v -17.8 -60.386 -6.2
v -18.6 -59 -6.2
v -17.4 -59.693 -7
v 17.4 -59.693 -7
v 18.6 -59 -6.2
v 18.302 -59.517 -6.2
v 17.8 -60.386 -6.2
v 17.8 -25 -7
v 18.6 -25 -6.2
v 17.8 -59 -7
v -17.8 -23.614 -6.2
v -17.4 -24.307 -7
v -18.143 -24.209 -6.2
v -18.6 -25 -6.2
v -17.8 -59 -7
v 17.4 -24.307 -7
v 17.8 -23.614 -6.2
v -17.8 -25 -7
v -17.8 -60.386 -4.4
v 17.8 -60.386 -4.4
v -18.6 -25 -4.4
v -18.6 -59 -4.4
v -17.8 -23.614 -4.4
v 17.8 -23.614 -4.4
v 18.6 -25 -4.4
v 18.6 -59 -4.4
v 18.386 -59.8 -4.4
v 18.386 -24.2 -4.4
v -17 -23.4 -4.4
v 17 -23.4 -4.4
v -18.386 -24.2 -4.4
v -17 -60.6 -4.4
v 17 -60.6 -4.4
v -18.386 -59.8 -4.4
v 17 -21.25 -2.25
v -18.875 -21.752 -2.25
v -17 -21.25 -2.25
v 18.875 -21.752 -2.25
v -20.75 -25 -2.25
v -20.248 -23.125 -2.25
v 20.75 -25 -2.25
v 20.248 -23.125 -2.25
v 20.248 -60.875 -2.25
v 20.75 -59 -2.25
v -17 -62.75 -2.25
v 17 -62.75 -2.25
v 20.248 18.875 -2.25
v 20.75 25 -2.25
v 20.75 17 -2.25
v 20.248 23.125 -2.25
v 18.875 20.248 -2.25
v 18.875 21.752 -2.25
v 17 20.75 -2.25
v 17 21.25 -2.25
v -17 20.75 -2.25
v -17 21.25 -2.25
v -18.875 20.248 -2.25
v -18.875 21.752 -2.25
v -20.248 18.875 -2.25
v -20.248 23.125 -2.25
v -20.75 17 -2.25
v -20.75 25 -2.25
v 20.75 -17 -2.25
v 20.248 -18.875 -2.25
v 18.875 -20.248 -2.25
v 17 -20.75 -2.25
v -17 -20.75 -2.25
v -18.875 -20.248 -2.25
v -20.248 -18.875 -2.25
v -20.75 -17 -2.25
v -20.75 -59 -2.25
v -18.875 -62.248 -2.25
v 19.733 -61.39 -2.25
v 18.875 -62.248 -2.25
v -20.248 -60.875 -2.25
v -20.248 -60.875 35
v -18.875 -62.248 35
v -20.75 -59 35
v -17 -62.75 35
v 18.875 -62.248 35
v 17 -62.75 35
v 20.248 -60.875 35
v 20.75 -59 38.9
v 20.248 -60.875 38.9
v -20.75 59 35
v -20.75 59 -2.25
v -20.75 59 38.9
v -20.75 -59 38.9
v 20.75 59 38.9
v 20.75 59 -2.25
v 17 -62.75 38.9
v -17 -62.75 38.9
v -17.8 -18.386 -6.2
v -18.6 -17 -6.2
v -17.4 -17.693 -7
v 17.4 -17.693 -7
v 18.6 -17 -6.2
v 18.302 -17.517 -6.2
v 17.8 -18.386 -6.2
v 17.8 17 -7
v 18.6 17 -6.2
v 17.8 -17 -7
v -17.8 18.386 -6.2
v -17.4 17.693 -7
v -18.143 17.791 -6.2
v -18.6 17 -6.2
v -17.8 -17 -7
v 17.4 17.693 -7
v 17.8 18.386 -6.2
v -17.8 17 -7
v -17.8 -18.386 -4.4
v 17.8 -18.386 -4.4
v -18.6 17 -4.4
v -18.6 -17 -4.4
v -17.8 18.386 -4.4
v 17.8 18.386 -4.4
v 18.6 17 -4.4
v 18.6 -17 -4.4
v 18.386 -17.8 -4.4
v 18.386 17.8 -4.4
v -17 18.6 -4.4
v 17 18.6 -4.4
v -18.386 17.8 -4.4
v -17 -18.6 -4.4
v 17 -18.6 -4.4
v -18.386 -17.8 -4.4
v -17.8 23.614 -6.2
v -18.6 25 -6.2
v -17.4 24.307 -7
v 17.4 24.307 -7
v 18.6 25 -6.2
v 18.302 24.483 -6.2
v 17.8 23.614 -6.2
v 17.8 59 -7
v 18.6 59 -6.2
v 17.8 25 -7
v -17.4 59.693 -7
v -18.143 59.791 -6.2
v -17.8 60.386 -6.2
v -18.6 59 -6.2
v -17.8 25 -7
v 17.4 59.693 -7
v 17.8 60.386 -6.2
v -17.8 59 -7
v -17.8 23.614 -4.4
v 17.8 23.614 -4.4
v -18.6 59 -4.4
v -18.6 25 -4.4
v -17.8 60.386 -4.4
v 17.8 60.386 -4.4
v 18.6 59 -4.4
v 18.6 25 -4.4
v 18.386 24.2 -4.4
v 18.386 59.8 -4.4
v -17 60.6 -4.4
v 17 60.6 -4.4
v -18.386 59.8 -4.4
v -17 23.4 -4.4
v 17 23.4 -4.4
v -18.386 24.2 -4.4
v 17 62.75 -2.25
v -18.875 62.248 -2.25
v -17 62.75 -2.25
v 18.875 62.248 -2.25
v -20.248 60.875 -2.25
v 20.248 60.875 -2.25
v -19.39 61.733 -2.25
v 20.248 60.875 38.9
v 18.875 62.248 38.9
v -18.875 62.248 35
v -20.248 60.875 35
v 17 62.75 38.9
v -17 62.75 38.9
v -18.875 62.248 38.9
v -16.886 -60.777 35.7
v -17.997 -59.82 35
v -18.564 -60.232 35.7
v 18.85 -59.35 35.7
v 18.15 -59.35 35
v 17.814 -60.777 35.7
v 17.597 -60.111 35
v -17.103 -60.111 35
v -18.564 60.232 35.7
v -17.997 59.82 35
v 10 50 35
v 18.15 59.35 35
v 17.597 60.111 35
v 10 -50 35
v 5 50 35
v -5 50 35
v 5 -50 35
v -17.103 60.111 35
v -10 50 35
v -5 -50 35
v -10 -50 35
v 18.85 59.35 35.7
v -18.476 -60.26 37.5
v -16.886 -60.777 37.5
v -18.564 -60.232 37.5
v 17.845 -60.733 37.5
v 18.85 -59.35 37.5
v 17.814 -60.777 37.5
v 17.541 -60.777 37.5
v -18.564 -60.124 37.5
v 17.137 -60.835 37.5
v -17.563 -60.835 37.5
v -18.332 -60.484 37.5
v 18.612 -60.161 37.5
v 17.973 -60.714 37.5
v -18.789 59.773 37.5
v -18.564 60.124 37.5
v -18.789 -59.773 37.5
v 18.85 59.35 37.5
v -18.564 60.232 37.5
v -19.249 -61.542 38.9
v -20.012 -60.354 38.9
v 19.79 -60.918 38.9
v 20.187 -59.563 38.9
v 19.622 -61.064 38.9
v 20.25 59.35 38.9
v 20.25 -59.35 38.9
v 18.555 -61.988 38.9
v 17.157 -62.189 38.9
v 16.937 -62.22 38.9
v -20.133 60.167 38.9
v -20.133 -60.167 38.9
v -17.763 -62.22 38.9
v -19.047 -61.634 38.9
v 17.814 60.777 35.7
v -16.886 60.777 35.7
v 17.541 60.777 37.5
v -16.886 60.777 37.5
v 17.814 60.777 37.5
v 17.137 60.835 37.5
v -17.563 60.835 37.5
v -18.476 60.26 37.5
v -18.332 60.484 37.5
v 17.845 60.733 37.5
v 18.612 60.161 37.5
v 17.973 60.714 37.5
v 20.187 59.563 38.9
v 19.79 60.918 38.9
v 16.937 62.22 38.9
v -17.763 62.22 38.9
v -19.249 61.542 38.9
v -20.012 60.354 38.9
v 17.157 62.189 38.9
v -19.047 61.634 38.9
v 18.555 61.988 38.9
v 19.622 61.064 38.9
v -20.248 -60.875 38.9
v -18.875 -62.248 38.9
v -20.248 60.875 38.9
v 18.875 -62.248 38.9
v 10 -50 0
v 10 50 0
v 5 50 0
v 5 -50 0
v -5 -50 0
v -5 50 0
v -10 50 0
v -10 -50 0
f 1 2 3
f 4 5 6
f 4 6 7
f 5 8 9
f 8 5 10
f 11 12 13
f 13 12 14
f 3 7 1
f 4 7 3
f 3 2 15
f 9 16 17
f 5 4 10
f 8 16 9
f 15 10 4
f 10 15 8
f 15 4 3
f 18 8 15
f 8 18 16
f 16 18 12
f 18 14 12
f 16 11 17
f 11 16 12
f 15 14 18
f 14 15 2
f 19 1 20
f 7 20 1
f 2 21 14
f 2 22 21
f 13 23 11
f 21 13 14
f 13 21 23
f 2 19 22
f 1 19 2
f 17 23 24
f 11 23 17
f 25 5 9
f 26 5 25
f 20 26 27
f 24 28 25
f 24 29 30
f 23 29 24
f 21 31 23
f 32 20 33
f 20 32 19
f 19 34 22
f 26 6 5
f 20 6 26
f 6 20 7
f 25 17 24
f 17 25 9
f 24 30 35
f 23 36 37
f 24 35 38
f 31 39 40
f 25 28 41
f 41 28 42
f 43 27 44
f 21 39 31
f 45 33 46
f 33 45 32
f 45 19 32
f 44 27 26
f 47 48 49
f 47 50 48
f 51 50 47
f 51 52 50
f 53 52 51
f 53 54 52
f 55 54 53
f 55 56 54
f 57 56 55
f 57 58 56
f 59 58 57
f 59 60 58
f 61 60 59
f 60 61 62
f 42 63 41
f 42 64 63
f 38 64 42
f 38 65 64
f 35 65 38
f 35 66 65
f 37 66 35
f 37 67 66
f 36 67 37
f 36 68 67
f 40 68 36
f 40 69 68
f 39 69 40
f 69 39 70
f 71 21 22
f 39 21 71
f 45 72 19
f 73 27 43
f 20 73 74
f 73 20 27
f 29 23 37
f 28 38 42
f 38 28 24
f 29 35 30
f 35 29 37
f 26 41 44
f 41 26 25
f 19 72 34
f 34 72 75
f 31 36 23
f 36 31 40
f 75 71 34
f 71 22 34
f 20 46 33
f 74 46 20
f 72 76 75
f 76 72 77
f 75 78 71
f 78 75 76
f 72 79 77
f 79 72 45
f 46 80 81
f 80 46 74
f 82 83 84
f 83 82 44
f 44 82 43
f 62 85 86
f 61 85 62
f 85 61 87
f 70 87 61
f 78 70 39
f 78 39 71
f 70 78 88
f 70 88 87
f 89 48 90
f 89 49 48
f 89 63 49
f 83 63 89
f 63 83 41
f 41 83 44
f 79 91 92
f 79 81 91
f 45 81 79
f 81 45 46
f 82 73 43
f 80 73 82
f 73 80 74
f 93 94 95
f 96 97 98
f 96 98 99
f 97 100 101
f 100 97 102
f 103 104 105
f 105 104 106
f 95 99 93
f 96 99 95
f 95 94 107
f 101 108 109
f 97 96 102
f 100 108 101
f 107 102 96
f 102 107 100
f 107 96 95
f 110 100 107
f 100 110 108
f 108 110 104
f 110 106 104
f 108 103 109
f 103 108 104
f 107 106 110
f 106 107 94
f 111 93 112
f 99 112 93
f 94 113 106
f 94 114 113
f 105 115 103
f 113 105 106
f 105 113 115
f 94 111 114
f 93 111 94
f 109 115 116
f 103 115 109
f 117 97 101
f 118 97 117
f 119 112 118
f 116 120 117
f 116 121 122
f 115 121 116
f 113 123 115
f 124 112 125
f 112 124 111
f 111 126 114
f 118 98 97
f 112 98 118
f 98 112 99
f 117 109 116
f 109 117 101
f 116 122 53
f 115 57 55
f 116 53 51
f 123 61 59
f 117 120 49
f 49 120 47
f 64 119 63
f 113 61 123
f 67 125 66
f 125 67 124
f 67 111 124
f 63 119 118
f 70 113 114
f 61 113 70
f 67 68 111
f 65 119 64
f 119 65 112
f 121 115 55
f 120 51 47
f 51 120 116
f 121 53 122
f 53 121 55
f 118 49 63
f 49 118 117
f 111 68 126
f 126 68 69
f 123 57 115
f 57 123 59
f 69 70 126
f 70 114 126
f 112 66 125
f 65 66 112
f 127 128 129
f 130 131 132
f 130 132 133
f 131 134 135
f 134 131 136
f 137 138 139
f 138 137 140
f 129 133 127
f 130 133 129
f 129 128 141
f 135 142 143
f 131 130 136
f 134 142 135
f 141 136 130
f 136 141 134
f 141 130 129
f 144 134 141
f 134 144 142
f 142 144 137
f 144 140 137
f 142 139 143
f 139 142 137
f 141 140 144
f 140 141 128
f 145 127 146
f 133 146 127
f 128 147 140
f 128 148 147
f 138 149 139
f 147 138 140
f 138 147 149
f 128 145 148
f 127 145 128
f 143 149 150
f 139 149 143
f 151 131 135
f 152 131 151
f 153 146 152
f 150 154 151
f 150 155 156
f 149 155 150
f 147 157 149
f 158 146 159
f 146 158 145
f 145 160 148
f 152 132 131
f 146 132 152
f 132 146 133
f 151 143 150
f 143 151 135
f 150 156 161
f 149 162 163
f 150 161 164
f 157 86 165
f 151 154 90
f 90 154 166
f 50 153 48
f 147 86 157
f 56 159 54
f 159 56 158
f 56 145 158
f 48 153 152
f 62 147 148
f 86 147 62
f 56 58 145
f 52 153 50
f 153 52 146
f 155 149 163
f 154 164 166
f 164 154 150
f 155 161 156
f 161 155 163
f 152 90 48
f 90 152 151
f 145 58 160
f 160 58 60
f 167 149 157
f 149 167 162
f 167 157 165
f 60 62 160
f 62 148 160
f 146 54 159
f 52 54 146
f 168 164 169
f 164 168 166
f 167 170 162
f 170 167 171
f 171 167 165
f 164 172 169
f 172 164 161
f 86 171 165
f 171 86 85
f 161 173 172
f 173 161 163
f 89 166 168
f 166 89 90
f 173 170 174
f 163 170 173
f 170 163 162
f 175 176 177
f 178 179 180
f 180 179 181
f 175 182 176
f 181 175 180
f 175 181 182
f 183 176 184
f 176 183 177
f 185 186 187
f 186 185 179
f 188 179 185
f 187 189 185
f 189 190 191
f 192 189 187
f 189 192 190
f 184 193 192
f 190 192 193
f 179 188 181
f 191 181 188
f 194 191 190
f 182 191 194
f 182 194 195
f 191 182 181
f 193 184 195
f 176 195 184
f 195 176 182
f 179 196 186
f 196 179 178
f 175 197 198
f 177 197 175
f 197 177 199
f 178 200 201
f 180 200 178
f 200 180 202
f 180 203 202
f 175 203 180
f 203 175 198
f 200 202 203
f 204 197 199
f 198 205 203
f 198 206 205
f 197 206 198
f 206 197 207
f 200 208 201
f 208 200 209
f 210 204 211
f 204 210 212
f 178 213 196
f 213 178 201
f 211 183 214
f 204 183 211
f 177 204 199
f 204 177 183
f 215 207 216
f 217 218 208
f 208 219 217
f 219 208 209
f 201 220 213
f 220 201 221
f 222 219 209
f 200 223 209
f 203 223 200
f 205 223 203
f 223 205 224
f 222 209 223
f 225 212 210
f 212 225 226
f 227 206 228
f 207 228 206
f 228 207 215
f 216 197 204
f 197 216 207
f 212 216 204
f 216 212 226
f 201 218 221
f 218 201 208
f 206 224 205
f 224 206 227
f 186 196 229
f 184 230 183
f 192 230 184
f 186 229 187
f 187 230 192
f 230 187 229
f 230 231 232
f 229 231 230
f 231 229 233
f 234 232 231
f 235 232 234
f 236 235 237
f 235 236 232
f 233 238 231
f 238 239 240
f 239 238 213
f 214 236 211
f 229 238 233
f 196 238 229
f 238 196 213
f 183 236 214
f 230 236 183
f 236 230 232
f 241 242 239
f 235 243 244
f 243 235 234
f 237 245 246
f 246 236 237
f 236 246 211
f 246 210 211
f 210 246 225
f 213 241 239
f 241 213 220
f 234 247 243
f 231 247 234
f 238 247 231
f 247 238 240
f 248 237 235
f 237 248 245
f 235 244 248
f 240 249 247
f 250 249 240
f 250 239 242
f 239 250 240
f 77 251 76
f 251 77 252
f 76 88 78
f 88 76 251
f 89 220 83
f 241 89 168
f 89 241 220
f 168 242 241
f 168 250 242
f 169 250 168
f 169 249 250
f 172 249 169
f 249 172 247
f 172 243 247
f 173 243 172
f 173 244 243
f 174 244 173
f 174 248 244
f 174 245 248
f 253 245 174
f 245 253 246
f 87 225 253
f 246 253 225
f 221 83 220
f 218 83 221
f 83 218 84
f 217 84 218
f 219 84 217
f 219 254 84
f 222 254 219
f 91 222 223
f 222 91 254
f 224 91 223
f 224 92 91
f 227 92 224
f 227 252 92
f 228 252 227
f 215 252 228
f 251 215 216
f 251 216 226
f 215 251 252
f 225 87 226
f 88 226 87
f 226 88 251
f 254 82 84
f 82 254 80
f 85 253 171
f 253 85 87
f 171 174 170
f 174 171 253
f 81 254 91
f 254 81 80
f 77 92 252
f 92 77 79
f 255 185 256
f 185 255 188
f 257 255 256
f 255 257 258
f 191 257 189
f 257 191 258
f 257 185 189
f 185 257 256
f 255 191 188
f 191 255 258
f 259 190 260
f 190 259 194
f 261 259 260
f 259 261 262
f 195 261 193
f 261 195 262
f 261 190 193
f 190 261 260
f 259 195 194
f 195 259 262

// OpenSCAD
// file: ../utils/misc.scad
module rounded_rectangle(width, height, corner_radius, center = false) {

    x_offset = center ? -width/2 : 0;
    y_offset = center ? -height/2 : 0;

    corners_points = [
            [corner_radius, corner_radius],
            [width - corner_radius, corner_radius],
            [width - corner_radius, height - corner_radius],
            [corner_radius, height - corner_radius],
        ];

    hull() {
        for (p = corners_points) {
            translate([p.x + x_offset, p.y + y_offset, -1])
                circle(corner_radius);
        }
    }
}


module circle_segment(radius, cut_off_height) {
    intersection() {
        translate([0, -cut_off_height]) {
            circle(radius);
        }
        translate([-radius, 0]) {
            square([radius * 2, cut_off_height * 2]);
        }
    }
}

module tear_drop_circle(d) {
    r = d / 2;
    angle = 30;
    offset_y = r / 2;
    offset_x = cos(angle) * r;

    triangle_points = [
            [-offset_x, r / 2],
            [offset_x, r / 2],
            [0, 3 / 2 * r]
        ];

    polygon(triangle_points);
    circle(d = d);

}
// file: ../utils/gridfinity/bin_stacking_lip.scad
include <./constants.scad>

use <../misc.scad>

height_level_1 = 0.7;
height_level_2 = 1.8;
height_level_3 = 1.9;
total_height = height_level_1 + height_level_2 + height_level_3;

cell_width = 41.5;
middle_width = cell_width - height_level_3 * 2;
bottom_width = middle_width - height_level_1 * 2;

top_radius = 7.5 / 2;
top_radius_adjusted = 7.5 / 2 - 0.35;
middle_radius_adjusted = 3.2 / 2 - 0.1;
bottom_radius = 1.6 / 2;

wall_width = 0.95;

module gf_stacking_lip(num_columns, num_rows, offset_gfus = 0) {

    total_width = cell_width * num_columns + (num_columns - 1) * GF_WIDTH_TOLERANCE;
    total_depth = cell_width * num_rows + (num_rows - 1) * GF_WIDTH_TOLERANCE;

    translate([0, 0, offset_gfus * GF_HEIGHT_1U]) {
        // main lip
        difference() {
            linear_extrude(total_height - 0.5) {
                translate([total_width / 2, total_depth / 2]) {
                    rounded_rectangle(total_width, total_depth, top_radius, center = true);
                }
            }

            _combined_cells_cut_out(num_columns, num_rows);
        }

        // bottom down-chamfer (ugly approximation of a prism-looking thing)
        chamfer_height = height_level_1 + height_level_3;
        translate([total_width / 2, total_depth / 2, -chamfer_height]) {
            difference() {
                linear_extrude(chamfer_height) {
                    rounded_rectangle(total_width, total_depth, top_radius, center = true);
                }

                x = (total_width / 2) - wall_width - chamfer_height + 0.15;
                y = (total_depth / 2) - wall_width - chamfer_height + 0.15;

                hull() {
                    for (p = [[-x, -y], [-x, y], [x, -y], [x, y]]) {
                        translate([p.x, p.y, 0]) {
                            cylinder(h = chamfer_height, r1 = top_radius_adjusted, r2 = bottom_radius);
                        }
                    }
                }
            }
        }
    }
}

module _combined_cells_cut_out(num_columns, num_rows) {
    // paint lots of ovelapping copies to create the final cut out. I couldn't use a simple hull to do it.

    points = [
        for (c = [0 : num_columns - 1]) for (r = [0 : num_rows - 1])
            [c, r]
        ];

    offset_x = -GF_WIDTH_TOLERANCE;
    offset_y = -GF_WIDTH_TOLERANCE;

    translate([offset_x, offset_y, 0]) {
        for (p = points) {
            cx = p.x * GF_WIDTH + GF_WIDTH / 2 + GF_WIDTH_TOLERANCE / 2;
            cy = p.y * GF_WIDTH + GF_WIDTH / 2 + GF_WIDTH_TOLERANCE / 2;

            translate([cx, cy]) {
                _single_cell_cut_out();
            }

            if (p.x < num_columns - 1) {
                translate([cx + cell_width / 2, cy]) {
                    _single_cell_cut_out();
                }
            }

            if (p.y < num_rows - 1) {
                translate([cx, cy + cell_width / 2]) {
                    _single_cell_cut_out();
                }
            }

            if (p.y < num_rows - 1 && p.x < num_columns - 1) {
                translate([cx + cell_width / 2, cy + cell_width / 2]) {
                    _single_cell_cut_out();
                }
            }
        }
    }
}

module _single_cell_cut_out() {
    union() {
        union() {
            // level 1
            offset_z = 0;
            t = (bottom_width / 2) - bottom_radius;
            hull() {
                for (p = [[-t, -t], [-t, t], [t, -t], [t, t]]) {
                    translate([p.x, p.y, offset_z]) {
                        cylinder(h = height_level_1, r1 = bottom_radius, r2 = middle_radius_adjusted);
                    }
                }
            }
        }

        union() {
            // level 2
            offset_z = height_level_1;
            t = (middle_width / 2) - middle_radius_adjusted;
            hull() {
                for (p = [[-t, -t], [-t, t], [t, -t], [t, t]]) {
                    translate([p.x, p.y, offset_z]) {
                        cylinder(h = height_level_2, r1 = middle_radius_adjusted, r2 = middle_radius_adjusted);
                    }
                }
            }
        }

        union() {
            // level 2
            offset_z = height_level_2 + height_level_1;
            t = (cell_width / 2) - top_radius_adjusted;
            hull() {
                for (p = [[-t, -t], [-t, t], [t, -t], [t, t]]) {
                    translate([p.x, p.y, offset_z]) {
                        cylinder(h = height_level_3, r1 = middle_radius_adjusted, r2 = top_radius_adjusted);
                    }
                }
            }
        }
    }
}
// file: ../utils/gridfinity/bin_base.scad
use <../misc.scad>
use <./functions.scad>
include <./constants.scad>


angle = 45;

height_level_1 = 0.8;
height_level_2 = 1.8;
height_level_3 = 2.15;
height_level_4 = GF_HEIGHT_1U - height_level_1 - height_level_2 - height_level_3;

inner_width = 35.6;
middle_width = inner_width + 0.8 * 2;
outer_width = middle_width + 2.15 * 2;

radius_outer = GF_BIN_CORNER_RADIUS;
radius_middle = 3.2 / 2;
radius_inner = 1.6 / 2;

module gf_combined_bin_bases(num_columns, num_rows, lowered = true) {
    points = [
        for (c = [0 : num_columns - 1]) for (r = [0 : num_rows - 1])
            [c, r]
        ];

    offset_x = -GF_WIDTH_TOLERANCE;
    offset_y = -GF_WIDTH_TOLERANCE;
    offset_z = lowered ? -GF_HEIGHT_1U : 0;

    translate([offset_x, offset_y, offset_z]) {
        for (p = points) {
            cx = p.x * GF_WIDTH + GF_WIDTH / 2 + GF_WIDTH_TOLERANCE / 2;
            cy = p.y * GF_WIDTH + GF_WIDTH / 2 + GF_WIDTH_TOLERANCE / 2;

            translate([cx, cy]) {
                bin_base();
            }
        }

        bin_floor(num_columns, num_rows);
    }
}

module gf_body(num_columns, num_rows, u_height) {
    linear_extrude(u_height * GF_HEIGHT_1U) {
        size = gf_get_plate_size(num_columns, num_rows);
        rounded_rectangle(size.x, size.y, radius_outer);
    }
}

module gf_wall(num_columns, num_rows, u_height) {
    wall_thickness = 0.95;

    linear_extrude(u_height * GF_HEIGHT_1U) {
        size = gf_get_plate_size(num_columns, num_rows);
        difference() {
            rounded_rectangle(size.x, size.y, radius_outer);
            translate([wall_thickness, wall_thickness]) {
                rounded_rectangle(size.x - wall_thickness*2, size.y - wall_thickness*2, radius_outer);
            }
        }
    }
}

module bin_floor(num_columns, num_rows) {
    offset_z = height_level_1 + height_level_2 + height_level_3;
    sx = (GF_WIDTH * num_columns) - GF_WIDTH_TOLERANCE;
    sy = (GF_WIDTH * num_rows) - GF_WIDTH_TOLERANCE;
    translate([GF_WIDTH_TOLERANCE / 2, GF_WIDTH_TOLERANCE / 2, offset_z]) {
        linear_extrude(height_level_4) {
            translate([GF_WIDTH_TOLERANCE / 2, GF_WIDTH_TOLERANCE / 2]) {
                rounded_rectangle(sx, sy, radius_outer);
            }
        }
    }
}

module bin_base(centered = true) {
    translation = centered ? [0, 0, 0] : [outer_width / 2, outer_width / 2, 0];
    translate(translation) {
        level_1();
        level_2();
        level_3();
        level_4();
    }
}

module level_1() {
    offset_z = 0;
    t = (inner_width / 2) - radius_inner;
    hull() {
        for (p = [[-t, -t], [-t, t], [t, -t], [t, t]]) {
            translate([p.x, p.y, offset_z]) {
                cylinder(h = height_level_1, r1 = radius_inner, r2 = radius_middle);
            }
        }
    }
}

module level_2() {
    offset_z = height_level_1;
    translate([0, 0, offset_z]) {
        linear_extrude(height_level_2) {
            translate([-middle_width / 2, -middle_width / 2]) {
                rounded_rectangle(middle_width, middle_width, radius_middle);
            }
        }
    }
}

module level_3() {
    offset_z = height_level_1 + height_level_2;
    t = (outer_width / 2) - radius_outer;
    hull() {
        for (p = [[-t, -t], [-t, t], [t, -t], [t, t]]) {
            translate([p.x, p.y, offset_z]) {
                cylinder(h = height_level_3, r1 = radius_middle, r2 = radius_outer);
            }
        }
    }
}

module level_4() {
    offset_z = height_level_1 + height_level_2 + height_level_3;
    translate([0, 0, offset_z]) {
        linear_extrude(height_level_4) {
            translate([-outer_width / 2, -outer_width / 2]) {
                rounded_rectangle(outer_width, outer_width, radius_outer);
            }
        }
    }
}
// file: ../utils/gridfinity/functions.scad
include <./constants.scad>

function gf_get_plate_size(num_columns, num_rows) =
    [
            num_columns * GF_WIDTH - GF_WIDTH_TOLERANCE,
            num_rows * GF_WIDTH - GF_WIDTH_TOLERANCE,
    ];

function gf_get_minimum_dimensions(width, length) =
    [
    ceil(width / GF_WIDTH),
    ceil(length / GF_WIDTH)
    ];
// file: ../utils/gridfinity/constants.scad
GF_HEIGHT_1U = 7;
GF_HEIGHT_PLATE = 4.75;
GF_WIDTH = 42;
GF_WIDTH_TOLERANCE = 0.5;

GF_BIN_CORNER_RADIUS = 7.5 / 2;
// main file
include <../utils/gridfinity/constants.scad>
use <../utils/gridfinity/functions.scad>
use <../utils/gridfinity/bin_base.scad>
use <../utils/gridfinity/bin_stacking_lip.scad>

tool_slot_width = 100;
tool_slot_depth = 5;
tool_slot_height = 100;

gf_columns = 1;
gf_rows = 3;

gf_size = gf_get_plate_size(gf_columns, gf_rows);

gridfinity_radius_tool_holder();

module gridfinity_radius_tool_holder() {
    difference() {
        translate([-gf_size.x / 2, -gf_size.y / 2]) {
            gf_combined_bin_bases(gf_columns, gf_rows);
            gf_body(gf_columns, gf_rows, 5);
            gf_stacking_lip(gf_columns, gf_rows, 5);
        }

        #union() {
            translate([-tool_slot_depth / 2, -tool_slot_width / 2]) {
                translate([tool_slot_depth * 1.5, 0]) {
                    cube([tool_slot_depth, tool_slot_width, tool_slot_height]);
                }
                translate([-tool_slot_depth * 1.5, 0]) {
                    cube([tool_slot_depth, tool_slot_width, tool_slot_height]);
                }
            }
        }
    }
}
